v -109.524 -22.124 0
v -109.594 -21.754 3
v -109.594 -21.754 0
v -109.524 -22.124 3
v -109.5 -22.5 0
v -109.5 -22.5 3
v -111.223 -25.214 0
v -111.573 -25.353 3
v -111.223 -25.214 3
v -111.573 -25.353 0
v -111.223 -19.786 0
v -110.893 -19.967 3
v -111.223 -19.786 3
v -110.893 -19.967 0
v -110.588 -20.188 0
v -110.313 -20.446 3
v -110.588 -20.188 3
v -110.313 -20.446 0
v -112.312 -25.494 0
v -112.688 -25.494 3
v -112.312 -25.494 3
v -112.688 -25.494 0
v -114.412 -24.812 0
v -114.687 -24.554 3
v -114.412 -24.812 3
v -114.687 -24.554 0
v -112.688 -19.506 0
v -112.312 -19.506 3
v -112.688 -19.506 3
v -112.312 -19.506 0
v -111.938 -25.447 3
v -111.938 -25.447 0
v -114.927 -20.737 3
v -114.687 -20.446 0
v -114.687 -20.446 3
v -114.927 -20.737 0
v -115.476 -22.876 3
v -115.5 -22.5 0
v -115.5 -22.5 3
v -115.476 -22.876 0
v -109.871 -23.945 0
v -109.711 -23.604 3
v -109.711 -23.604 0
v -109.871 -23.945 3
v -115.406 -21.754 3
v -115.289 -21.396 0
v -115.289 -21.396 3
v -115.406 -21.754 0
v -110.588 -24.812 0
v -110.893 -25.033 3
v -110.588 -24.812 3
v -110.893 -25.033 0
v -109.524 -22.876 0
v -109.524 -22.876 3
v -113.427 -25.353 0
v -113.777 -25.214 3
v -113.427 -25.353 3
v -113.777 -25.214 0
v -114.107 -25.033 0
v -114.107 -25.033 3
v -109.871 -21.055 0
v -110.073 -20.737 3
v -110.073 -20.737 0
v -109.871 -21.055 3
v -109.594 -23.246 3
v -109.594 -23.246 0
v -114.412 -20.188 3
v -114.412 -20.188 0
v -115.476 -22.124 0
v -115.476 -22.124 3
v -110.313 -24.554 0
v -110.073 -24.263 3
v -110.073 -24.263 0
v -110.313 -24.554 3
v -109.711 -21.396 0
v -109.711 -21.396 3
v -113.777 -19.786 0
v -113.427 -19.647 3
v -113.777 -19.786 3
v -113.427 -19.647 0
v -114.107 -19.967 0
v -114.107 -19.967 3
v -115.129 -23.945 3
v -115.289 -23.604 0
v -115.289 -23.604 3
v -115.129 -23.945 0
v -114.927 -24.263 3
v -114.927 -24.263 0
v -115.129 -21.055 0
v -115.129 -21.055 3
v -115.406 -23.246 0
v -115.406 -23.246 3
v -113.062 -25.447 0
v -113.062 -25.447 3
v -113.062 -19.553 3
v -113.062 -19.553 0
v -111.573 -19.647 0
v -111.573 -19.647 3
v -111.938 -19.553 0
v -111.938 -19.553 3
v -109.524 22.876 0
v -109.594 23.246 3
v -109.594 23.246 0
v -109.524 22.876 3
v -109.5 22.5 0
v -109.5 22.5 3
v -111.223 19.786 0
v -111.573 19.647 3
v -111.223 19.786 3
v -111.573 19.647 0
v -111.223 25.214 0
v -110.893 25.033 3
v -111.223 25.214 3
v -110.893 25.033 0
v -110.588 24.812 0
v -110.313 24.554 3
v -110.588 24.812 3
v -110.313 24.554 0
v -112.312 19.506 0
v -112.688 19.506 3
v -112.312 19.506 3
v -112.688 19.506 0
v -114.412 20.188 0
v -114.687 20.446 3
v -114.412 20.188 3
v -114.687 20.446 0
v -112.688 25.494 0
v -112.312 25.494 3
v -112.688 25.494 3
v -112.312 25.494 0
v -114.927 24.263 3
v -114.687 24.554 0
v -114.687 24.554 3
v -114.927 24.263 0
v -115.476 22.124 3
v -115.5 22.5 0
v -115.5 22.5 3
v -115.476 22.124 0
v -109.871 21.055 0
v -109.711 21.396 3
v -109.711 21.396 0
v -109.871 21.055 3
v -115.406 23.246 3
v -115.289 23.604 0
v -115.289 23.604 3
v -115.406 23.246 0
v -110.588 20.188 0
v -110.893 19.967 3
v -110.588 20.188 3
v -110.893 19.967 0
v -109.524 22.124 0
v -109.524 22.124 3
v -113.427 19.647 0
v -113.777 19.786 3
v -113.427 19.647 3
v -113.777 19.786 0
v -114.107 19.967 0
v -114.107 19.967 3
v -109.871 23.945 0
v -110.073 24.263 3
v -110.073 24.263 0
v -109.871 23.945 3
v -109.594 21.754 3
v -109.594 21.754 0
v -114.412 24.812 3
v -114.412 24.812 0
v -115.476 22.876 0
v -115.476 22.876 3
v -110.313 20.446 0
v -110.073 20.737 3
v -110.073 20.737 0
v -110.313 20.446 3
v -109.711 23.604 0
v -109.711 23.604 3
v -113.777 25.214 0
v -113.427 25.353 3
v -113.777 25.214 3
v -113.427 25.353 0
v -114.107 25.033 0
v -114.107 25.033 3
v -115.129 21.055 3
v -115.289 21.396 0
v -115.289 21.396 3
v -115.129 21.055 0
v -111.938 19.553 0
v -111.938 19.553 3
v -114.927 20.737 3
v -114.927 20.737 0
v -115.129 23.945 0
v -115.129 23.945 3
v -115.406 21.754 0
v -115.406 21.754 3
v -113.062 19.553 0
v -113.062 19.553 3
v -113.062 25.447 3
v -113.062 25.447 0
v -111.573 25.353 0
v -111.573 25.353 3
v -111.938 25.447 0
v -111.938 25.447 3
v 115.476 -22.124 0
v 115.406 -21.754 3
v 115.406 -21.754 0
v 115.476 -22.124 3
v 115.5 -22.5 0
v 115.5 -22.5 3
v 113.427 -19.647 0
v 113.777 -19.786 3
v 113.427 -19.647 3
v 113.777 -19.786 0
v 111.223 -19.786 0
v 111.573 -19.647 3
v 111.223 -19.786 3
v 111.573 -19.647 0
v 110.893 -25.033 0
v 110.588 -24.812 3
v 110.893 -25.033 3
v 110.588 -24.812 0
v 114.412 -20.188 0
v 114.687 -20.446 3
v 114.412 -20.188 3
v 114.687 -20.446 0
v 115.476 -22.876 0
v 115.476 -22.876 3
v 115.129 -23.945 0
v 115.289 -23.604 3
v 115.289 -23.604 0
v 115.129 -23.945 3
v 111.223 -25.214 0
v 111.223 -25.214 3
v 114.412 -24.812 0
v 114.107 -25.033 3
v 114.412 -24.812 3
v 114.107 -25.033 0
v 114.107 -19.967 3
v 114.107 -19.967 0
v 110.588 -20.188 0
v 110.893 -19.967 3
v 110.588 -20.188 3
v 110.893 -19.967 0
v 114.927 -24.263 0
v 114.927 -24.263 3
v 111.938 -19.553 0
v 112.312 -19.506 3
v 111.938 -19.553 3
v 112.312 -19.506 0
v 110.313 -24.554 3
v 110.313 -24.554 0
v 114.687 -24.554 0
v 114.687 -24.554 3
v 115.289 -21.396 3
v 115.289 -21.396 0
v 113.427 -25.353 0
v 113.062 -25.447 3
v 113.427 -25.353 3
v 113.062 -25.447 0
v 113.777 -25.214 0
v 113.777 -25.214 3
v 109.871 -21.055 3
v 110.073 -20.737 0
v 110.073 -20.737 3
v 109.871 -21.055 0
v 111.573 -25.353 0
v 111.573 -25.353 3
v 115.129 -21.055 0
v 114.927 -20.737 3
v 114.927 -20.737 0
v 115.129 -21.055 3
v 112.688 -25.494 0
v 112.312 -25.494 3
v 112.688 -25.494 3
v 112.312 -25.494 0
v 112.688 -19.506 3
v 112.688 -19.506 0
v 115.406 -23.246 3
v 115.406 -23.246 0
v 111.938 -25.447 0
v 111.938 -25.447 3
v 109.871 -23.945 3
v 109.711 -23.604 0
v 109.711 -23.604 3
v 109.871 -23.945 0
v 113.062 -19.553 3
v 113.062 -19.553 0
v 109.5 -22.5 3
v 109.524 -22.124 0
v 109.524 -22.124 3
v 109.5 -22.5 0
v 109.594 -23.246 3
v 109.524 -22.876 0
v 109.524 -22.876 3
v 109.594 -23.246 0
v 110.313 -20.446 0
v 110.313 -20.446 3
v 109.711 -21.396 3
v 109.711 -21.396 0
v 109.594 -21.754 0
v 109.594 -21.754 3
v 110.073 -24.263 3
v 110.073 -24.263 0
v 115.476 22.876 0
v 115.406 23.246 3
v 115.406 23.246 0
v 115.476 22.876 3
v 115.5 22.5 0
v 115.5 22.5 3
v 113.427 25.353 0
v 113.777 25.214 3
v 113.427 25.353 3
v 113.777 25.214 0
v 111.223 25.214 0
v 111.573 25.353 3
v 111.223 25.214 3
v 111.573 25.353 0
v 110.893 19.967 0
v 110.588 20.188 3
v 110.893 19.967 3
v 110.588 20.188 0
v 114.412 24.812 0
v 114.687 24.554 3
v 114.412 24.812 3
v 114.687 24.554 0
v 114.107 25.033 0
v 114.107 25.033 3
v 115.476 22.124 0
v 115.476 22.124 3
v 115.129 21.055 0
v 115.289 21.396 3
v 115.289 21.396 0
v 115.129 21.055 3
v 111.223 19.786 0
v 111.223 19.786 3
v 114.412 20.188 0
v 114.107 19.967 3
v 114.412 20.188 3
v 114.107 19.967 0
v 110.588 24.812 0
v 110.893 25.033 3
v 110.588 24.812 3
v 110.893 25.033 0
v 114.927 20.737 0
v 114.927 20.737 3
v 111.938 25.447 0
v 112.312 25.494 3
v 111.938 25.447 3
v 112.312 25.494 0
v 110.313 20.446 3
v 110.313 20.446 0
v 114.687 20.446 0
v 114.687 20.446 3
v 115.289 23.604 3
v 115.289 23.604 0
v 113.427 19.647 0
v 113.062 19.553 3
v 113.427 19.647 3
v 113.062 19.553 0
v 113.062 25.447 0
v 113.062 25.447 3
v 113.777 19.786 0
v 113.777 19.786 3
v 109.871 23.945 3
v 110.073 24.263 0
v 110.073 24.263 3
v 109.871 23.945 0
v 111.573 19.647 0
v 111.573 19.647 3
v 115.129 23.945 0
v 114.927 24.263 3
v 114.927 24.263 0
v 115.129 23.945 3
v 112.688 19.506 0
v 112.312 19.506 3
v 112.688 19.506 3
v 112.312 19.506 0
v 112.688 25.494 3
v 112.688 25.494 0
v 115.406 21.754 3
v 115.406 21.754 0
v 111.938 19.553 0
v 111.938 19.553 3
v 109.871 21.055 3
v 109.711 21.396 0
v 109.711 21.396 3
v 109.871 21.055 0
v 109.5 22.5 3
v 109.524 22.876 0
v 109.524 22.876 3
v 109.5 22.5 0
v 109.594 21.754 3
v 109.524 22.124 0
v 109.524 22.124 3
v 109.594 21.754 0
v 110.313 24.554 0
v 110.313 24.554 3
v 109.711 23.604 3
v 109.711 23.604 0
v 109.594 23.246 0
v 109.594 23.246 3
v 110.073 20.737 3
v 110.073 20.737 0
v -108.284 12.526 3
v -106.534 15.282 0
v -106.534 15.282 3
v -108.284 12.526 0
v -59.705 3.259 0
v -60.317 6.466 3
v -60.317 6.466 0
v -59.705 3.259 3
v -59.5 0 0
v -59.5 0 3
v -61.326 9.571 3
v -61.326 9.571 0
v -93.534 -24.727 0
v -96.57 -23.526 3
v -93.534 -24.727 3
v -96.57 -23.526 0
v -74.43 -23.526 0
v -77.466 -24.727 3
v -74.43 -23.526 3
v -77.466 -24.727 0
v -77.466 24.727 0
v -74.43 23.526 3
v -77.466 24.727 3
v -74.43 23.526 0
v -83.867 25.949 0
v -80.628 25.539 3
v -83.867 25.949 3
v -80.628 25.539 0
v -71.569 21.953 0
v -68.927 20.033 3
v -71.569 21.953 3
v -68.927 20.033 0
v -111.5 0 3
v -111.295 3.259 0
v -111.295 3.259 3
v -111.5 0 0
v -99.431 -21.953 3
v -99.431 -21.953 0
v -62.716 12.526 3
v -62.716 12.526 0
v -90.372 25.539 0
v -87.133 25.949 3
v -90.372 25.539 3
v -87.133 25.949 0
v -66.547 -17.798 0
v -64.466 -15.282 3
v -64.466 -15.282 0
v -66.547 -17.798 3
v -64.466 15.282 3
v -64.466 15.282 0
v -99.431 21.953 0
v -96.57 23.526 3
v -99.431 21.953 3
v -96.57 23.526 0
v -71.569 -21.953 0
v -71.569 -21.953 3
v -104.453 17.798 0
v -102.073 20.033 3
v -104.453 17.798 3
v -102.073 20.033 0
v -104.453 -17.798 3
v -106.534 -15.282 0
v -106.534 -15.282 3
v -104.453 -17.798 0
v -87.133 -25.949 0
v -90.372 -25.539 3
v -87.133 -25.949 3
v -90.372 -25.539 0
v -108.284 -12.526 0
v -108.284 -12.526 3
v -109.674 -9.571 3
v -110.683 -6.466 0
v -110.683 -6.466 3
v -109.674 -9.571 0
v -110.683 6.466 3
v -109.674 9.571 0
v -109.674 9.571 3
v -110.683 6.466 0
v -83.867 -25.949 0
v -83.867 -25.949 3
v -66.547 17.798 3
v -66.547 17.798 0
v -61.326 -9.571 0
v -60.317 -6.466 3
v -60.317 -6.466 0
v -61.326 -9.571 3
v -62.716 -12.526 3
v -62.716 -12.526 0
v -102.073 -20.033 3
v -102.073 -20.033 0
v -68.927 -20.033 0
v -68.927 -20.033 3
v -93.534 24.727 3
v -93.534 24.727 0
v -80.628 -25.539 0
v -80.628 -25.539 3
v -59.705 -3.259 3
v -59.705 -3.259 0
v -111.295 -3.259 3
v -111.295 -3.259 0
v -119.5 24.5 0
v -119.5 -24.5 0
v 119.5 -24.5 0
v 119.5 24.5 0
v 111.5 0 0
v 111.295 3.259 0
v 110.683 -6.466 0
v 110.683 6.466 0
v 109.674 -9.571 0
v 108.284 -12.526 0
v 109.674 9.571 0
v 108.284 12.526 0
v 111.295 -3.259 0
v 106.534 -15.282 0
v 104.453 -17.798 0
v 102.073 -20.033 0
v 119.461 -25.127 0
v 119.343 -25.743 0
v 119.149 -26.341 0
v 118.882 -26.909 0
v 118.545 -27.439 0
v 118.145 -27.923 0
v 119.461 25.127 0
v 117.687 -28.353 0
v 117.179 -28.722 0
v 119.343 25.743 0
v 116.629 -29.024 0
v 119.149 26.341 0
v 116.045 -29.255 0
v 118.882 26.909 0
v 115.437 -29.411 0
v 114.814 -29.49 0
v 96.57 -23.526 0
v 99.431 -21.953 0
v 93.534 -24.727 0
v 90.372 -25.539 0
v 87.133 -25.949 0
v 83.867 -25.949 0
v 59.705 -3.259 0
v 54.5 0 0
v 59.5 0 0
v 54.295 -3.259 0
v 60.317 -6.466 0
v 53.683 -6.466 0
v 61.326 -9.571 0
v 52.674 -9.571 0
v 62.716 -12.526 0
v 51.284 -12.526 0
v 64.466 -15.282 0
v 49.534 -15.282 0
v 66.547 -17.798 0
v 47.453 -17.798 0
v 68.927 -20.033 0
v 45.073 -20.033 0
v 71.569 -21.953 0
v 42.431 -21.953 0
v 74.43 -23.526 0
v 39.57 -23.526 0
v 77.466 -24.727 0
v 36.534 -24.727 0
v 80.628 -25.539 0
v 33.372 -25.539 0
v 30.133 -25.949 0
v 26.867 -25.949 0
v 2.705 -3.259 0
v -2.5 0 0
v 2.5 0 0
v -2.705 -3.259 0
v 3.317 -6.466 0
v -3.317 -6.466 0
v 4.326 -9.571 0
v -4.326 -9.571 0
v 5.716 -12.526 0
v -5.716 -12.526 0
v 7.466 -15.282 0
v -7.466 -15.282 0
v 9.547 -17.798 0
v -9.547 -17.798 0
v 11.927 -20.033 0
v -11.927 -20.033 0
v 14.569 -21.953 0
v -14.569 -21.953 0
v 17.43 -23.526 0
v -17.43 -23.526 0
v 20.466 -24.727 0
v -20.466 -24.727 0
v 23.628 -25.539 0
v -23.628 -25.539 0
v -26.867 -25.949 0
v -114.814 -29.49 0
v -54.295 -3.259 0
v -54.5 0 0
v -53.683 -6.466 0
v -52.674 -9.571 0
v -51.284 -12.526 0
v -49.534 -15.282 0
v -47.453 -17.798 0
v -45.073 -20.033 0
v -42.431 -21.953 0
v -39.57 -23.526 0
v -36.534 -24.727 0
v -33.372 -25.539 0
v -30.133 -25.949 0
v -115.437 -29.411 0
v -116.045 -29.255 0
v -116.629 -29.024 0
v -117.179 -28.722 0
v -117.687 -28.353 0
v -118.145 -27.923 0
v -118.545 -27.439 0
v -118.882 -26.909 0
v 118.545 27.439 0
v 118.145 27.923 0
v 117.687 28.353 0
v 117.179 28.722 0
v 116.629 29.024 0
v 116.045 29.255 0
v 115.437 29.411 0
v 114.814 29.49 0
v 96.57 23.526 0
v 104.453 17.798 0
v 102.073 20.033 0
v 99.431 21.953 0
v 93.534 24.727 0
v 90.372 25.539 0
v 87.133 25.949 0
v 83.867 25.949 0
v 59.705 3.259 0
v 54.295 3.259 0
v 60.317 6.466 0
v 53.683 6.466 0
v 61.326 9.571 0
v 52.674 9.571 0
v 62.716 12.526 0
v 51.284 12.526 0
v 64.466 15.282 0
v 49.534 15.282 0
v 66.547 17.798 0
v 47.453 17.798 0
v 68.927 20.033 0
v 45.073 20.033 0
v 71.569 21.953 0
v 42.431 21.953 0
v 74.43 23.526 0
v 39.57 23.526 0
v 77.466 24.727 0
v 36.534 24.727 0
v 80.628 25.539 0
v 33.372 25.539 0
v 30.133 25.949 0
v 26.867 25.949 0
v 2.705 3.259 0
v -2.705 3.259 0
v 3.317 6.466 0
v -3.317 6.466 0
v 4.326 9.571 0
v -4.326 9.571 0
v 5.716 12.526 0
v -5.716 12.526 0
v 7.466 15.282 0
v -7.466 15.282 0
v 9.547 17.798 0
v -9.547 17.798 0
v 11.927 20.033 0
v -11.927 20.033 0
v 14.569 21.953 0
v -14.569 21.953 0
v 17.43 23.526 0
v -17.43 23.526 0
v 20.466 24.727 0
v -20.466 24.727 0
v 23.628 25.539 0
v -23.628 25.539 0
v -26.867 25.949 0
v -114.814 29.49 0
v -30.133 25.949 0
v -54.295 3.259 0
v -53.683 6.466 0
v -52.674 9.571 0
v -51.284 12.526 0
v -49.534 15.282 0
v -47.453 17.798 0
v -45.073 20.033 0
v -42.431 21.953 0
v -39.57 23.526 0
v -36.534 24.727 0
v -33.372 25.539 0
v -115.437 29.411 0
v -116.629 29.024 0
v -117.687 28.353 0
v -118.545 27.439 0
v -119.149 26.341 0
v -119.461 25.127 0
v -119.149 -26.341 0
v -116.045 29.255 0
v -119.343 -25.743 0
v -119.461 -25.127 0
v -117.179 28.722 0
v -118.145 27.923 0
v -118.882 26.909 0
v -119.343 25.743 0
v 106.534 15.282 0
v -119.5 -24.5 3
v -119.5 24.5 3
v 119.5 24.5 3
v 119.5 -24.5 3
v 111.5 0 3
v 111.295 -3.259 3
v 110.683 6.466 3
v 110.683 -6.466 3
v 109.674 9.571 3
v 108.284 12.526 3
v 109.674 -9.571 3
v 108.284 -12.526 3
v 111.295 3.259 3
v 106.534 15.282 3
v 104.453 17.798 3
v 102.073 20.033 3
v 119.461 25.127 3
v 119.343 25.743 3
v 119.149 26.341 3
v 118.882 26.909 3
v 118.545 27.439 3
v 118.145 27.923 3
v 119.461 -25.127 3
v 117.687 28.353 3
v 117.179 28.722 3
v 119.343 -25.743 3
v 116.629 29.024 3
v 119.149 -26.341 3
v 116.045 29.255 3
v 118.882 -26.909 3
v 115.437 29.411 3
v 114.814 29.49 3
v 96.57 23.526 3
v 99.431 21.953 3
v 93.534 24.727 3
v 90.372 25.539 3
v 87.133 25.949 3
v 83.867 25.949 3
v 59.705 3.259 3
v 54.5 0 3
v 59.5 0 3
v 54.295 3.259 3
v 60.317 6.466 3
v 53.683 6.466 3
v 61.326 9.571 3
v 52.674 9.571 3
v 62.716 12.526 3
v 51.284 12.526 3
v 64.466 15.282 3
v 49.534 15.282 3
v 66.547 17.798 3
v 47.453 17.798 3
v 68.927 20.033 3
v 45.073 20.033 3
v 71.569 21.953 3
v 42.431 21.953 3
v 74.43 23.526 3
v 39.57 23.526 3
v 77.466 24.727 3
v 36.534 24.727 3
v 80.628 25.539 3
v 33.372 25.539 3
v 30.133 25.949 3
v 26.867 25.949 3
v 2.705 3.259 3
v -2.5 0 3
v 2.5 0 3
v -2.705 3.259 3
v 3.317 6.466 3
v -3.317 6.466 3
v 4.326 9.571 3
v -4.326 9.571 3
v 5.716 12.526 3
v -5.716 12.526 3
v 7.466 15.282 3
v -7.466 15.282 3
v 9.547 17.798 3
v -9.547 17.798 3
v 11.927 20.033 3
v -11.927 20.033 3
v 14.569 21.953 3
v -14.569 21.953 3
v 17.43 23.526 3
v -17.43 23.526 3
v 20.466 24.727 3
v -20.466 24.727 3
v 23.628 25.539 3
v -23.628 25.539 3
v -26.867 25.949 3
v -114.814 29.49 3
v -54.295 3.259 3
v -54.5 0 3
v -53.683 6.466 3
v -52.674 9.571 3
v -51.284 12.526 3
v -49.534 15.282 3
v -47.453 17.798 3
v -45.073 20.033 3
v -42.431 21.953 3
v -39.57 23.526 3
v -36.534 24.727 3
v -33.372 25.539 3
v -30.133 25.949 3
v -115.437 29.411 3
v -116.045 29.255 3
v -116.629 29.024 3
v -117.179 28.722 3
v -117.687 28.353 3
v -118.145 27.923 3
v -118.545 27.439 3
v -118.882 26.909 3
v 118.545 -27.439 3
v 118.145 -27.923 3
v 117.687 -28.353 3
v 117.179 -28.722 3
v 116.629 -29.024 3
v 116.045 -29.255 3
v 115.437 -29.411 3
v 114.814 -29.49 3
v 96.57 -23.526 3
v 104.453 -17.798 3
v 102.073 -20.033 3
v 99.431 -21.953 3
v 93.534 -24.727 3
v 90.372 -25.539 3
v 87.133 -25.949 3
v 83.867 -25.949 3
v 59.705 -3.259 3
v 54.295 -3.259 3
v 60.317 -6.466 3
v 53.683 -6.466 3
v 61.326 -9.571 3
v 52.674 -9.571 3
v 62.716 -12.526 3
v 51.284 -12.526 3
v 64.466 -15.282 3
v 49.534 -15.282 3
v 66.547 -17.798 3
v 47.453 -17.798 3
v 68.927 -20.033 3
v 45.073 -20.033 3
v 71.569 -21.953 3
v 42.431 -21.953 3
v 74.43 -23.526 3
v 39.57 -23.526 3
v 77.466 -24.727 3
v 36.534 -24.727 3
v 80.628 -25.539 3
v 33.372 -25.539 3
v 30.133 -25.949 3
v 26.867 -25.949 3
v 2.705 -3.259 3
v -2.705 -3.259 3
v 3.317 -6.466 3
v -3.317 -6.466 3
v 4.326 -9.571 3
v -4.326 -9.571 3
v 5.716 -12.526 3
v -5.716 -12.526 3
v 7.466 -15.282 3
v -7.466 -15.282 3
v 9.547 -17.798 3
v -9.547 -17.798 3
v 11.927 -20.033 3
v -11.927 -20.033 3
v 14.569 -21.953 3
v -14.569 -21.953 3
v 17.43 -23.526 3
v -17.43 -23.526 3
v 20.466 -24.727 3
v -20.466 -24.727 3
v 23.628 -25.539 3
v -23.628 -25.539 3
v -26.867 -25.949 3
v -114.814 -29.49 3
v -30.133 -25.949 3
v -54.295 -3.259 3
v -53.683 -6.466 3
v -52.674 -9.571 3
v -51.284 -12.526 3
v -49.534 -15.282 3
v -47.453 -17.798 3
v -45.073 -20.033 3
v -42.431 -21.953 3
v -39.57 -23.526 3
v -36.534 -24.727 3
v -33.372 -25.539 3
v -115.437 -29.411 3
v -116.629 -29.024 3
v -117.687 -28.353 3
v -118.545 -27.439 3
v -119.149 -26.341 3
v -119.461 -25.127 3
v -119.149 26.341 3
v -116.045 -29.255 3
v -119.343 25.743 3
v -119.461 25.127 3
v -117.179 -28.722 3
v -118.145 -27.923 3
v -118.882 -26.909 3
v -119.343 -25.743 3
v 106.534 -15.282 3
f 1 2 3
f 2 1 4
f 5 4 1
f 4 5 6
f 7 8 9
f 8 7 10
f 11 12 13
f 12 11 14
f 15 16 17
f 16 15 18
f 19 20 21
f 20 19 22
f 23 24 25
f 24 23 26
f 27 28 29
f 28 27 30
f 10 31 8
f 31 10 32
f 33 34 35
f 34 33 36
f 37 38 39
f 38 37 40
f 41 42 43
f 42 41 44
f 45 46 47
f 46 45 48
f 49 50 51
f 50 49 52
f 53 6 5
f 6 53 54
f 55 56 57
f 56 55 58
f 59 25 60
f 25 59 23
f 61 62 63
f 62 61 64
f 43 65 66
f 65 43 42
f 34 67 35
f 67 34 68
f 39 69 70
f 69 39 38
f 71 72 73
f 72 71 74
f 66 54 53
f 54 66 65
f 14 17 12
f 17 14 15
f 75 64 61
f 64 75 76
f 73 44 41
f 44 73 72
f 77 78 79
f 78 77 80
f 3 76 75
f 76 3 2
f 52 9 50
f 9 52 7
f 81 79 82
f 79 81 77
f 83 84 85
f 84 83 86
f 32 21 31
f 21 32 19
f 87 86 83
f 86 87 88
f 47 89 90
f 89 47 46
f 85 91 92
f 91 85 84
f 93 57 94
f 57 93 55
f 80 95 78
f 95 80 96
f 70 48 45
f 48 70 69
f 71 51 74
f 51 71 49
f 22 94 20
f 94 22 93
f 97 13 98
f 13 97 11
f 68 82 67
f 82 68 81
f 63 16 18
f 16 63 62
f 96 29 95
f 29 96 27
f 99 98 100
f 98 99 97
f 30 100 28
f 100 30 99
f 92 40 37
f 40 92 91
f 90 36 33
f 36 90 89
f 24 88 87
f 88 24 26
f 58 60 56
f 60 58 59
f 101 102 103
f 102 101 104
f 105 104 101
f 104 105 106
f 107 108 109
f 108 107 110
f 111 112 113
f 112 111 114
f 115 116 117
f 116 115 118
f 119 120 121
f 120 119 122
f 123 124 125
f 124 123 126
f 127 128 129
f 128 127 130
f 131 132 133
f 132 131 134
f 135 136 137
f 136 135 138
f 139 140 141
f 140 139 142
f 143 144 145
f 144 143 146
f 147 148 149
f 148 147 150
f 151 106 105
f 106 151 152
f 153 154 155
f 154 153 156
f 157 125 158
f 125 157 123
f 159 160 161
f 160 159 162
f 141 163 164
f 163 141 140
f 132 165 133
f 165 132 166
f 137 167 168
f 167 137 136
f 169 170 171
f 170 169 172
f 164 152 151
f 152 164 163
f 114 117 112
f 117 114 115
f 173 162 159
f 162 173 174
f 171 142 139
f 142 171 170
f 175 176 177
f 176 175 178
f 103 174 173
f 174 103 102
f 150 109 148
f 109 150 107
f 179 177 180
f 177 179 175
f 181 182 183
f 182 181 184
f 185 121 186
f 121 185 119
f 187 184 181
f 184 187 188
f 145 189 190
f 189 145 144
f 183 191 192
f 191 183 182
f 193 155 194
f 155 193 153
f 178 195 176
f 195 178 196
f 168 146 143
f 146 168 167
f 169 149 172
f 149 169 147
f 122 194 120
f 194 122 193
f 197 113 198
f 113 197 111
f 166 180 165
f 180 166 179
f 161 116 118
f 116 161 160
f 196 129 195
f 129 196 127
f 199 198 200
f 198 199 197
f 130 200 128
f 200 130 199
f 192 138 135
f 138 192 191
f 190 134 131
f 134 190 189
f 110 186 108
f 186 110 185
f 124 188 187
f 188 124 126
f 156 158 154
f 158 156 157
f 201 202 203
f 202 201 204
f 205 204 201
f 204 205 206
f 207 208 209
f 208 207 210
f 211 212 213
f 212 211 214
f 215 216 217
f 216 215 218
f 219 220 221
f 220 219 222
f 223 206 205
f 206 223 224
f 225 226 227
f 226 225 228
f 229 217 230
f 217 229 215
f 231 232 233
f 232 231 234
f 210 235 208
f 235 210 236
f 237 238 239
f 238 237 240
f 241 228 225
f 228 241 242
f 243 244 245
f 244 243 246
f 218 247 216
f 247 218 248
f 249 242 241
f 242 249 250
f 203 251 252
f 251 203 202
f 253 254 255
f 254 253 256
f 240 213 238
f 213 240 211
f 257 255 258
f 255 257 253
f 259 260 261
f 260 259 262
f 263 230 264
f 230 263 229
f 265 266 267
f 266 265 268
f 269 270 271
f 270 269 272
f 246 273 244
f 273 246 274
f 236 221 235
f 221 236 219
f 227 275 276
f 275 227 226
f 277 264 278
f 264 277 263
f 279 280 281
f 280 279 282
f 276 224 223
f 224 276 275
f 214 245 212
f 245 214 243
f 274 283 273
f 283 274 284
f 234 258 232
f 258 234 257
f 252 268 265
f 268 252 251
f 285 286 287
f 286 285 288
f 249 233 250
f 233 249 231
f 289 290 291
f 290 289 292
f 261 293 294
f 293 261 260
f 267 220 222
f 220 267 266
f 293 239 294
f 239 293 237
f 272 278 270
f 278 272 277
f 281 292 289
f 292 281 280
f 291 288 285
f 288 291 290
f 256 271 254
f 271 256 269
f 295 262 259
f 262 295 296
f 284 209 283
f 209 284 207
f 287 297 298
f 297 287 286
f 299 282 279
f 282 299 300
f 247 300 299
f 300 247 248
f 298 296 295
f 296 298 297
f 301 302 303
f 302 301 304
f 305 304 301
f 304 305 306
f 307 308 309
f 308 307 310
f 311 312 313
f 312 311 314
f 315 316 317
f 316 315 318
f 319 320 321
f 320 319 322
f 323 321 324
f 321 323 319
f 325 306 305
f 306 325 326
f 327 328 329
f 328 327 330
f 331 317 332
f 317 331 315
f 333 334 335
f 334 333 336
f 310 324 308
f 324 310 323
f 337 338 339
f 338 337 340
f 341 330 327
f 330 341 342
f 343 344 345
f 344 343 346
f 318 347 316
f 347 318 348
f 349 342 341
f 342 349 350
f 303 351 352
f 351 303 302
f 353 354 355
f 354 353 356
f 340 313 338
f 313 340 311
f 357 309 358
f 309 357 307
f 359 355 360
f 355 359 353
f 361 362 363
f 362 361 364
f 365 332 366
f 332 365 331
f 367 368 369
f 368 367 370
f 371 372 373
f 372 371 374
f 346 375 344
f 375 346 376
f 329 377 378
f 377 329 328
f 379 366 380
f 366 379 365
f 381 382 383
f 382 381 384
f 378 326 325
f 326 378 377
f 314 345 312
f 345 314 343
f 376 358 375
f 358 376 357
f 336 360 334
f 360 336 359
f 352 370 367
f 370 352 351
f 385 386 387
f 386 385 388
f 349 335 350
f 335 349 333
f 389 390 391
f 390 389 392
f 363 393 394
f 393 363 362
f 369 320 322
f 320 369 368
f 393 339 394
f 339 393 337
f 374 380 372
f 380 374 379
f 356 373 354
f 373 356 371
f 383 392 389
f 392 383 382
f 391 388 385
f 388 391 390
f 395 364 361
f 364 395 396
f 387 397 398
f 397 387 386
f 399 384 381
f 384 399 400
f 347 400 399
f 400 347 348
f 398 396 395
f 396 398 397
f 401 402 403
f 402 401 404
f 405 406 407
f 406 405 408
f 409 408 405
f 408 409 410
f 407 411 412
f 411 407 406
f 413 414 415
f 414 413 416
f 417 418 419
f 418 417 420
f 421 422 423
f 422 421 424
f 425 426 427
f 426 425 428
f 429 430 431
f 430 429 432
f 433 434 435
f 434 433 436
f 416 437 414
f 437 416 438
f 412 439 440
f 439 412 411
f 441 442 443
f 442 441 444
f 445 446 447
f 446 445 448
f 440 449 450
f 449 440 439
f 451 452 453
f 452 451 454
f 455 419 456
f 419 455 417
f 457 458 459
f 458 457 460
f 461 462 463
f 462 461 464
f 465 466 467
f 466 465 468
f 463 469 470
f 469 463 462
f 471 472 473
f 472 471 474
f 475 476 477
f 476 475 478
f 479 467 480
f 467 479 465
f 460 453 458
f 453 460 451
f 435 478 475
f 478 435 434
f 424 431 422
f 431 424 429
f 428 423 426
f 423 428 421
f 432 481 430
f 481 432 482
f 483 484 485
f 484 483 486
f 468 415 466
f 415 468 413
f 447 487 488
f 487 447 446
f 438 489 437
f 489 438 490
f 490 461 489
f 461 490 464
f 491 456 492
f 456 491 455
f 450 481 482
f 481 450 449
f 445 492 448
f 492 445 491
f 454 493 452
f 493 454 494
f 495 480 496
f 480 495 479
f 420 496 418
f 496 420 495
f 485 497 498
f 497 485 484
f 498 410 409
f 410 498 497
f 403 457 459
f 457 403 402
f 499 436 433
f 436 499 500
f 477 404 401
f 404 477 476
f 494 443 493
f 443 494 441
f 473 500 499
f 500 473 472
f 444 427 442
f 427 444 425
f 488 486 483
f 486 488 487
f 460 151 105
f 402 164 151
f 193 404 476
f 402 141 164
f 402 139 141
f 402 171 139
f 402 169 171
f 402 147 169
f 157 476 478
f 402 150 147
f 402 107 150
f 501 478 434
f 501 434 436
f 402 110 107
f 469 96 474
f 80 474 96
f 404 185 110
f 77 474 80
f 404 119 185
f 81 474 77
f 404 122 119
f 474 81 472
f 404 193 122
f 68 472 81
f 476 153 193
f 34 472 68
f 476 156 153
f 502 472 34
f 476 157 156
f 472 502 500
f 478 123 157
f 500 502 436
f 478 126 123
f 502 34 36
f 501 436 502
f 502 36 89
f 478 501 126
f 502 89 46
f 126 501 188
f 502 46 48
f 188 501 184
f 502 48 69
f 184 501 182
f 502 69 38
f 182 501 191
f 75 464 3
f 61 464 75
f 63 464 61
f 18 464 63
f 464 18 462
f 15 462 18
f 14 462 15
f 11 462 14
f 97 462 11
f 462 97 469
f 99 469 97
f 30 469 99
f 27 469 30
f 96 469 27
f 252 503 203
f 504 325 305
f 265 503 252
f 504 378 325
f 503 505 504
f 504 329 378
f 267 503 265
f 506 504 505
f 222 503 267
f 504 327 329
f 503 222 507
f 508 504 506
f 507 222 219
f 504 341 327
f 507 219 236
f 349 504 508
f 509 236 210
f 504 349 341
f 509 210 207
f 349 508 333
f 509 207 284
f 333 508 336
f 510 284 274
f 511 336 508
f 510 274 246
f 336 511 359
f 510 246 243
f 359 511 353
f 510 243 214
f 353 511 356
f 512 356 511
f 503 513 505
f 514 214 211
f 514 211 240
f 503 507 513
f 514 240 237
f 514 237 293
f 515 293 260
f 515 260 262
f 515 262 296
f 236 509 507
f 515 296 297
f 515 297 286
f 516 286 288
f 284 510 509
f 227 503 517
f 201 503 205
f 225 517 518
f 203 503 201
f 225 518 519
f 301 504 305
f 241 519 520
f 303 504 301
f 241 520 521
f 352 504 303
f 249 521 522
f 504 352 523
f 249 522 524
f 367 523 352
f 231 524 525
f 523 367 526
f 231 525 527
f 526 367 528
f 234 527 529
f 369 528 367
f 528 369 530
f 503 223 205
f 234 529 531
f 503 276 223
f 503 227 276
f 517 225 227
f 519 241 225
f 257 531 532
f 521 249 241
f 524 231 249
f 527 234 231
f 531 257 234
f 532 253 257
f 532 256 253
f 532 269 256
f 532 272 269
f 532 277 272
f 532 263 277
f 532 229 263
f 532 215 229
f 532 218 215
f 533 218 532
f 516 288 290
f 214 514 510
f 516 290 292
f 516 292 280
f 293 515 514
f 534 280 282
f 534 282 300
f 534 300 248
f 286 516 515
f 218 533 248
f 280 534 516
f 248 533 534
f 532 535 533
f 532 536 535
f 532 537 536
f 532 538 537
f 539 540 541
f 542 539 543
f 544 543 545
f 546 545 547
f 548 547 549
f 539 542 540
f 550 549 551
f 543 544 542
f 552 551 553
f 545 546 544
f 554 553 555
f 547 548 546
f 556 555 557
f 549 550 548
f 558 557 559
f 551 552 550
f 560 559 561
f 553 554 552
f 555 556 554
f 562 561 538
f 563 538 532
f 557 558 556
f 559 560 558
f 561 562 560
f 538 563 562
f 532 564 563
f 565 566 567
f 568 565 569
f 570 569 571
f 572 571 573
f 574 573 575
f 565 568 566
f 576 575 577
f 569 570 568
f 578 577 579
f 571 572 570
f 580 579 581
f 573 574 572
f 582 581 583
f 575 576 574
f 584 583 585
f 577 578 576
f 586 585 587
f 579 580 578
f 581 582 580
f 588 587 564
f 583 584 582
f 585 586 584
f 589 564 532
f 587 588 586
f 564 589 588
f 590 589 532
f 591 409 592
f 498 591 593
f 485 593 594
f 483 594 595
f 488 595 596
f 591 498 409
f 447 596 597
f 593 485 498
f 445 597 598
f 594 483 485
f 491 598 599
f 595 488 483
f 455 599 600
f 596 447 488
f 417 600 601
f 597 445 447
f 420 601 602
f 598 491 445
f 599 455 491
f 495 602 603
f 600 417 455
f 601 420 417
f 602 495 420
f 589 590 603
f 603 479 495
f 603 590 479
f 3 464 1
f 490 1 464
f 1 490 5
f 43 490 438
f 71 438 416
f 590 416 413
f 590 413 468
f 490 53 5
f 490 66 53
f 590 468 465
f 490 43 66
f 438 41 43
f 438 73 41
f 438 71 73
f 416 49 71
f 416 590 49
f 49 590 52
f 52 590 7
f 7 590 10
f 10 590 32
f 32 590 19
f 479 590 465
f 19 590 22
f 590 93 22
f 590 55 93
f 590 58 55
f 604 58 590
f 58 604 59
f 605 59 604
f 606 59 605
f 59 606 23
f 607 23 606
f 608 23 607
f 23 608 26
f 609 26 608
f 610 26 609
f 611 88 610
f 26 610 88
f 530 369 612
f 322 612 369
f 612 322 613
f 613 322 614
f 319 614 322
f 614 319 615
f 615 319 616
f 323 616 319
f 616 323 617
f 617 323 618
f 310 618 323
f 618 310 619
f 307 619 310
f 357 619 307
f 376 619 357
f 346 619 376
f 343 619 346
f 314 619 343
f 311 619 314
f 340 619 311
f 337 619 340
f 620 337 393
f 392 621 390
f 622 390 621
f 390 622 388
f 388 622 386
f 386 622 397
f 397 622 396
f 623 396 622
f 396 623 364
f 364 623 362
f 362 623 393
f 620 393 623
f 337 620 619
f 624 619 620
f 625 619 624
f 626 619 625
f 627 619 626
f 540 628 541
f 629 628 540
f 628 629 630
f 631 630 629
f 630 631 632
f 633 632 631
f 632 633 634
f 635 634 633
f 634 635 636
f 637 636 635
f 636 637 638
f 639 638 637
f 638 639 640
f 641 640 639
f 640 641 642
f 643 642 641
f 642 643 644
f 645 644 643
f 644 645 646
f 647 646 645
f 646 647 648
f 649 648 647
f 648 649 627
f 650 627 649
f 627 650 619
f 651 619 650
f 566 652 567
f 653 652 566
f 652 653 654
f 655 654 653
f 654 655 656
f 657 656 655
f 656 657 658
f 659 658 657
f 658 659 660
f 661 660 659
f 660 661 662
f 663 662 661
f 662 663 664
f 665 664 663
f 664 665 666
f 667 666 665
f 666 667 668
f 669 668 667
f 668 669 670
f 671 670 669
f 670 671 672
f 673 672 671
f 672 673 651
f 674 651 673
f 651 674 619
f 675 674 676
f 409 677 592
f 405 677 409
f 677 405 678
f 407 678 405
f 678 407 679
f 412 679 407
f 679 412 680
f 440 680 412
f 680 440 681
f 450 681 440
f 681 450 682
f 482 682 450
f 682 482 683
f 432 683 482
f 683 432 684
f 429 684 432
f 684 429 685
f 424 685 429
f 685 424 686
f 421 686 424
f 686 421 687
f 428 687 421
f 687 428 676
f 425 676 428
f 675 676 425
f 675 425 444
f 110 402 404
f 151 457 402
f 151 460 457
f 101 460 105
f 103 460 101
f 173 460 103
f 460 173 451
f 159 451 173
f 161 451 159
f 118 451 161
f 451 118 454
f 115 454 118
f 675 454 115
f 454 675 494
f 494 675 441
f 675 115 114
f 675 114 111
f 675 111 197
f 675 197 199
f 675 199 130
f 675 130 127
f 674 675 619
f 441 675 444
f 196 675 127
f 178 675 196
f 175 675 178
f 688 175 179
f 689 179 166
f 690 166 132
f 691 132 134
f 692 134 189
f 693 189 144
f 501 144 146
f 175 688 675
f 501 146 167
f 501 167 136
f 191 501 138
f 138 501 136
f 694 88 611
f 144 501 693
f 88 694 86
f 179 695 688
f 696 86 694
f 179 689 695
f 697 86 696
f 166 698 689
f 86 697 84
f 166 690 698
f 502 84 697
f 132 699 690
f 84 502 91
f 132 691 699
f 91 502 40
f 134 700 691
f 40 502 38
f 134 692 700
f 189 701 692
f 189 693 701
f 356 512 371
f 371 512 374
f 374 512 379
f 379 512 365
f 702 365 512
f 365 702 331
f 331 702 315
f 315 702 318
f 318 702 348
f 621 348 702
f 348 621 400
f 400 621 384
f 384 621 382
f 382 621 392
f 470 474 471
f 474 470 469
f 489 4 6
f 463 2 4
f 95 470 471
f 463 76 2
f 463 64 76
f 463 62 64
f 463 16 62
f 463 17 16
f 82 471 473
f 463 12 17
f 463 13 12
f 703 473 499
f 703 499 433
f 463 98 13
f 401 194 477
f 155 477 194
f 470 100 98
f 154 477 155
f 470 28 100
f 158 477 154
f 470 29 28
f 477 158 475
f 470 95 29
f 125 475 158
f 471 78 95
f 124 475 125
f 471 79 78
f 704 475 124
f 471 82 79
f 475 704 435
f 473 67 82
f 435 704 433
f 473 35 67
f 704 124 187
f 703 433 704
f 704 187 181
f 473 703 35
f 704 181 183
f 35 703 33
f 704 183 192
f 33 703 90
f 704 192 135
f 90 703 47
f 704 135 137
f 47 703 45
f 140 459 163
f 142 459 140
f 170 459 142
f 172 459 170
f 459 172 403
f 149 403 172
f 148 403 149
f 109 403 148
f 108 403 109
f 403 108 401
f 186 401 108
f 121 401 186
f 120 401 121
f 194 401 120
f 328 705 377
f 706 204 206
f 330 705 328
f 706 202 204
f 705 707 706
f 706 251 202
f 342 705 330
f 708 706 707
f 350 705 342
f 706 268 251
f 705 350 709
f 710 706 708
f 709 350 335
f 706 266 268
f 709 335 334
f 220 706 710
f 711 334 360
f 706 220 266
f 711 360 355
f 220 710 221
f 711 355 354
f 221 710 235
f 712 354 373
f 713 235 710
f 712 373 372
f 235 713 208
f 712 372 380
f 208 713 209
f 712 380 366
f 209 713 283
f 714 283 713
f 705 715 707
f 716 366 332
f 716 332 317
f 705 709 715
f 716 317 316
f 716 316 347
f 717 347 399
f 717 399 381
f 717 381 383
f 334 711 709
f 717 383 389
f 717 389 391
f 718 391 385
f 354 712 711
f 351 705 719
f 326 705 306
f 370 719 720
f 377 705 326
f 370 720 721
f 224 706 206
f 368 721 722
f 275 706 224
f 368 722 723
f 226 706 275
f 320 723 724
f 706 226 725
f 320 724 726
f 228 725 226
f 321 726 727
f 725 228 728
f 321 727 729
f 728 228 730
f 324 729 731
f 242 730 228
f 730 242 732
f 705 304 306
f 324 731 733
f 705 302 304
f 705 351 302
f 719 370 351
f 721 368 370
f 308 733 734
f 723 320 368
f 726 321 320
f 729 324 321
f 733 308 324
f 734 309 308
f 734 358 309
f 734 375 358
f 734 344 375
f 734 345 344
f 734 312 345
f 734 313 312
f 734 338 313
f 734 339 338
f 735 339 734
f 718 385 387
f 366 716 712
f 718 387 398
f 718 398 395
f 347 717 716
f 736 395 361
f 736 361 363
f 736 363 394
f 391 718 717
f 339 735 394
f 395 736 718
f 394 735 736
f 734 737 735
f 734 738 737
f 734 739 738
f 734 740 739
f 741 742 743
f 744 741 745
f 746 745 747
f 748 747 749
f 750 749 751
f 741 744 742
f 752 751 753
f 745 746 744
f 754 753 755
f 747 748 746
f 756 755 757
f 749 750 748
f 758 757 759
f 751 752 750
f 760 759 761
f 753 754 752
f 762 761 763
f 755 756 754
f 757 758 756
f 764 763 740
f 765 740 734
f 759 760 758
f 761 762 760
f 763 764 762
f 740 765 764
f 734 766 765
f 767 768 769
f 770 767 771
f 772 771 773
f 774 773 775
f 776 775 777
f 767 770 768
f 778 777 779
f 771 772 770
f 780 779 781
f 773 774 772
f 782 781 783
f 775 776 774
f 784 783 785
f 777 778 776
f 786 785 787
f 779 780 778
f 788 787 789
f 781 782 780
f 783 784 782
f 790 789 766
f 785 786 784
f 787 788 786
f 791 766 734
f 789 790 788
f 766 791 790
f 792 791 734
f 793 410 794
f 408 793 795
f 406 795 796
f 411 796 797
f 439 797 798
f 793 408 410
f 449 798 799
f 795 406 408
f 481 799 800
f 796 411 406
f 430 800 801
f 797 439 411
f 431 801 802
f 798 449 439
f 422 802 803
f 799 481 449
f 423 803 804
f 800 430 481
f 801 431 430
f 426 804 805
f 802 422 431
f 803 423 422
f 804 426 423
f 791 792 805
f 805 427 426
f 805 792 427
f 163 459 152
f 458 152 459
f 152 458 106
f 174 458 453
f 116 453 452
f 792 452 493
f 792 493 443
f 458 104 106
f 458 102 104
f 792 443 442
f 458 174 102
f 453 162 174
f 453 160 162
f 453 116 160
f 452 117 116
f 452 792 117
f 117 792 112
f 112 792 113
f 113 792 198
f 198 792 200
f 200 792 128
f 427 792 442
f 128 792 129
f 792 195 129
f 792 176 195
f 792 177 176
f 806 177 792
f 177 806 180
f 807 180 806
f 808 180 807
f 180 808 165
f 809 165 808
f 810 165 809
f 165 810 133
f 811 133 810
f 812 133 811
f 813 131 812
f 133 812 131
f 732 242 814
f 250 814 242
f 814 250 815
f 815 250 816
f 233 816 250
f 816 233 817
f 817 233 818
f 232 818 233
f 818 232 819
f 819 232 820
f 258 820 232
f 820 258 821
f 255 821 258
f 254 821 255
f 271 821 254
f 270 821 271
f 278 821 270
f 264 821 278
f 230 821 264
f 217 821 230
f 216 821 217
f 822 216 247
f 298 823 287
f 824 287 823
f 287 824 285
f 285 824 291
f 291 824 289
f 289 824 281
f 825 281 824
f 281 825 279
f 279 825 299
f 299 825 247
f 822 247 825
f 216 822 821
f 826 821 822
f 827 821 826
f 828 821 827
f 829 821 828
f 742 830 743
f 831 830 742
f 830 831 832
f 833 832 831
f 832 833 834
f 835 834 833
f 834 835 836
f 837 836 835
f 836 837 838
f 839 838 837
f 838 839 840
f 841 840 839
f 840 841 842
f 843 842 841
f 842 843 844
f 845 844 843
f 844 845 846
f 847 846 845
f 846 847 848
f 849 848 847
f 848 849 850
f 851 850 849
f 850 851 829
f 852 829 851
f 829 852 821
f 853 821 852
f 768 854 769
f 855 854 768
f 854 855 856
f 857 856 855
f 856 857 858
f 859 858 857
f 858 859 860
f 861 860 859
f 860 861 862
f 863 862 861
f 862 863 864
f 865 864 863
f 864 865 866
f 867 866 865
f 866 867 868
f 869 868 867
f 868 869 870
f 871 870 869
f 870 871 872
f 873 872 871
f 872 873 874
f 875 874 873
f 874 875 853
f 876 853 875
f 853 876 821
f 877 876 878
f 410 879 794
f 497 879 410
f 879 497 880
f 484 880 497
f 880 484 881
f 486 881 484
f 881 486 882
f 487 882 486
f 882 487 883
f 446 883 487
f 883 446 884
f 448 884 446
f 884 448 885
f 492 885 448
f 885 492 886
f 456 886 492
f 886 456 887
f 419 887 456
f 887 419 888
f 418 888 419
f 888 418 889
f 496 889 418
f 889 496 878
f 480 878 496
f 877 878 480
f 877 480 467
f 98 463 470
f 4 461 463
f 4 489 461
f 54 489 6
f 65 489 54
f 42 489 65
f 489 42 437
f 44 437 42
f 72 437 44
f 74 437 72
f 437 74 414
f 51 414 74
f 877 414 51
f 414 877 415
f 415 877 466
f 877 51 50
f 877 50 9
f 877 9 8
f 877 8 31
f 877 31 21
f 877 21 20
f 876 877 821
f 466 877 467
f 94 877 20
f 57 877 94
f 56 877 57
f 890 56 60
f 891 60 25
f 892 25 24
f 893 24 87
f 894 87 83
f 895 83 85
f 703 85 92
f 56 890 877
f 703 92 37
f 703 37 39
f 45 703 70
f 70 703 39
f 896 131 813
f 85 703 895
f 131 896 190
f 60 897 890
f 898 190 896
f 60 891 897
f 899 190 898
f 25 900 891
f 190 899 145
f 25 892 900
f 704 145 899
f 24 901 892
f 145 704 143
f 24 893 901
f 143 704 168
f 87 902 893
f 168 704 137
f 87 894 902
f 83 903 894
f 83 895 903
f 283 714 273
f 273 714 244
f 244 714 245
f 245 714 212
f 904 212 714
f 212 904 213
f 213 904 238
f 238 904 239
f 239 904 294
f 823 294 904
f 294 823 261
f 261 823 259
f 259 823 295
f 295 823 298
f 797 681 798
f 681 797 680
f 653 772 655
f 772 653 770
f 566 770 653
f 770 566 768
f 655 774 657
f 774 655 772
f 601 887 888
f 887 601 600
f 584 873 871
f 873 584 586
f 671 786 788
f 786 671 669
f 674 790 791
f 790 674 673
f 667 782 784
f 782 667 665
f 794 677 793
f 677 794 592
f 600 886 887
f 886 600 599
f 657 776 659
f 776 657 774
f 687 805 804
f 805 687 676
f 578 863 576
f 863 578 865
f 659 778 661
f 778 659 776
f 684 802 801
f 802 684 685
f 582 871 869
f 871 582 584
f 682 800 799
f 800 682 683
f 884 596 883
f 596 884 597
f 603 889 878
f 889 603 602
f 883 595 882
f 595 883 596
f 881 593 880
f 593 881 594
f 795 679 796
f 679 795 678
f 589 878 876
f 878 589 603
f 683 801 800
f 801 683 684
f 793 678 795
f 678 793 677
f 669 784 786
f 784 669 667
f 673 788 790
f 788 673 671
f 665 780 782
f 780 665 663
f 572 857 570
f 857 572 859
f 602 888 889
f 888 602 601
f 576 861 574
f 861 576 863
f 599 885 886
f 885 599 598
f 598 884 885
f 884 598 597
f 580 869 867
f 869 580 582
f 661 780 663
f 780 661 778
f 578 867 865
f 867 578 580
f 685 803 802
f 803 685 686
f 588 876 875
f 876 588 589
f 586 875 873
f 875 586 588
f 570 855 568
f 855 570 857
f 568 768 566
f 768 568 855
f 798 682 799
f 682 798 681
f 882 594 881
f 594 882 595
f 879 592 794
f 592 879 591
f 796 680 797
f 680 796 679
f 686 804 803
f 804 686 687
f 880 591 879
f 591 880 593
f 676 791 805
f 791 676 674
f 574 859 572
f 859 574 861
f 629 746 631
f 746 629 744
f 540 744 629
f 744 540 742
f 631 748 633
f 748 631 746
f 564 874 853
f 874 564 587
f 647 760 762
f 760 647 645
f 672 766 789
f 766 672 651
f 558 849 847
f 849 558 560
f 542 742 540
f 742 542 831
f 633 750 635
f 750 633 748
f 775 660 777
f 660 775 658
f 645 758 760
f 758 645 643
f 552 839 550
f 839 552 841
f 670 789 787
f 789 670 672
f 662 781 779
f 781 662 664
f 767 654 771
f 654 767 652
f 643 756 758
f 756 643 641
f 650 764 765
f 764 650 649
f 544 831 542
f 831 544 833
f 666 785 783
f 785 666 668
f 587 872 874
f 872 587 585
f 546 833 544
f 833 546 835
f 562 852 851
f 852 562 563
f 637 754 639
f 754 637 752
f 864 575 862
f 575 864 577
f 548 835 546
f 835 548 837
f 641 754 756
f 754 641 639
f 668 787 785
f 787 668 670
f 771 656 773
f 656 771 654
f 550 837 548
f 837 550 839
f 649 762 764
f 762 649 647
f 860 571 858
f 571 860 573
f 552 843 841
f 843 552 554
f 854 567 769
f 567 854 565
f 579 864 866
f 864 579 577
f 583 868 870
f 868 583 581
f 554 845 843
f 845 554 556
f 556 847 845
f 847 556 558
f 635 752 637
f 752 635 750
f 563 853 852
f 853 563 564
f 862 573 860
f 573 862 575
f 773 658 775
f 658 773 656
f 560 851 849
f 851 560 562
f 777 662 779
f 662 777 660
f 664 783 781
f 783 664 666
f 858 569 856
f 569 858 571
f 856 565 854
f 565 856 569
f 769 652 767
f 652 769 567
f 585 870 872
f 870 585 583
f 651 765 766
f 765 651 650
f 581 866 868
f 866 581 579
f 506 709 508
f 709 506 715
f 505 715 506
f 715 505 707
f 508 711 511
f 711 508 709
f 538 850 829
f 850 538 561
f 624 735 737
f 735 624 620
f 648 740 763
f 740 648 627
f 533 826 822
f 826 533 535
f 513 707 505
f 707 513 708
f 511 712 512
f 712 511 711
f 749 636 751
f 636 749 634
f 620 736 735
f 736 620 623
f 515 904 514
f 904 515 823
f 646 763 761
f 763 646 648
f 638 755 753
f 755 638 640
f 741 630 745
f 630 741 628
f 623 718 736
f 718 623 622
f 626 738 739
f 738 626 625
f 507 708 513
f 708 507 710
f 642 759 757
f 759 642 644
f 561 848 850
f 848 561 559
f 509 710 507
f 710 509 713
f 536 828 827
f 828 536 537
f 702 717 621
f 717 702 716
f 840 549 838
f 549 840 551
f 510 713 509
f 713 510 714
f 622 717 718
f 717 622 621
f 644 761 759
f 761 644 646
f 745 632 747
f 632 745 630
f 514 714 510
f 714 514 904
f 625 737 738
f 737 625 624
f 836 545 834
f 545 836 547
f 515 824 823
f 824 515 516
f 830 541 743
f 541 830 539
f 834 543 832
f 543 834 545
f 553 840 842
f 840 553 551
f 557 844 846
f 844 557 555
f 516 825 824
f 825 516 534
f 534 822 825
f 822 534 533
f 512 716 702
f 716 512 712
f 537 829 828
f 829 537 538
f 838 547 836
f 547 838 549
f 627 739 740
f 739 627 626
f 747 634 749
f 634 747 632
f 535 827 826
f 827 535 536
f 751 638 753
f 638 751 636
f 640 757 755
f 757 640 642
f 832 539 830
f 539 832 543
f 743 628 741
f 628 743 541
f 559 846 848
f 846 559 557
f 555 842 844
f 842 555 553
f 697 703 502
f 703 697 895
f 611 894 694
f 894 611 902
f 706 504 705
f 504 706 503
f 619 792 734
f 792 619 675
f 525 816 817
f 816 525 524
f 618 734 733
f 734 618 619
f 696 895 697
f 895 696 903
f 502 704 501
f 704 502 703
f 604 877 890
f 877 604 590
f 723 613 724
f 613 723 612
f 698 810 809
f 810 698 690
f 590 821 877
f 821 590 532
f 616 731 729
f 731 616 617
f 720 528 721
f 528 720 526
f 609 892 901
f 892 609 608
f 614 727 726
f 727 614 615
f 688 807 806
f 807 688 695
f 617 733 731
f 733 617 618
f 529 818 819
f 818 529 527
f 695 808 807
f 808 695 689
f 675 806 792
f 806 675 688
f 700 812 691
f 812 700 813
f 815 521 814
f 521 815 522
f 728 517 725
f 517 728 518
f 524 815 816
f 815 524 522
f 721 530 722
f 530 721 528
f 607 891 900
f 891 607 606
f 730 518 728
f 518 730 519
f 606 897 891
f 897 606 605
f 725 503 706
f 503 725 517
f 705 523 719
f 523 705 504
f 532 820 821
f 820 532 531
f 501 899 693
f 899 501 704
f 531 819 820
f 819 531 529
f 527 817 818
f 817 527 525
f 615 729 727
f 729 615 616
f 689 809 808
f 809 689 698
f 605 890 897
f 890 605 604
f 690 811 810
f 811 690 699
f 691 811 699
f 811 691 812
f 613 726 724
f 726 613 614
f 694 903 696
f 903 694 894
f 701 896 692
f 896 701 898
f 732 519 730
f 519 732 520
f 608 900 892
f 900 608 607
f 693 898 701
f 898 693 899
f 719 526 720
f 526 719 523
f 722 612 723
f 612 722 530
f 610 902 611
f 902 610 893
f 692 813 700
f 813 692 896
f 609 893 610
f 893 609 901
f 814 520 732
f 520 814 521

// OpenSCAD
$fn = 50;


difference() {
	union() {
		hull() {
			translate(v = [-114.5000000000, 24.5000000000, 0]) {
				cylinder(h = 3, r = 5);
			}
			translate(v = [114.5000000000, 24.5000000000, 0]) {
				cylinder(h = 3, r = 5);
			}
			translate(v = [-114.5000000000, -24.5000000000, 0]) {
				cylinder(h = 3, r = 5);
			}
			translate(v = [114.5000000000, -24.5000000000, 0]) {
				cylinder(h = 3, r = 5);
			}
		}
	}
	union() {
		#translate(v = [-112.5000000000, -22.5000000000, -100.0000000000]) {
			cylinder(h = 200, r = 3.0000000000);
		}
		#translate(v = [-112.5000000000, 22.5000000000, -100.0000000000]) {
			cylinder(h = 200, r = 3.0000000000);
		}
		#translate(v = [112.5000000000, -22.5000000000, -100.0000000000]) {
			cylinder(h = 200, r = 3.0000000000);
		}
		#translate(v = [112.5000000000, 22.5000000000, -100.0000000000]) {
			cylinder(h = 200, r = 3.0000000000);
		}
		#translate(v = [-85.5000000000, 0, 0]) {
			cylinder(h = 3, r = 26.0000000000);
		}
		#translate(v = [-28.5000000000, 0, 0]) {
			cylinder(h = 3, r = 26.0000000000);
		}
		#translate(v = [28.5000000000, 0, 0]) {
			cylinder(h = 3, r = 26.0000000000);
		}
		#translate(v = [85.5000000000, 0, 0]) {
			cylinder(h = 3, r = 26.0000000000);
		}
	}
}
